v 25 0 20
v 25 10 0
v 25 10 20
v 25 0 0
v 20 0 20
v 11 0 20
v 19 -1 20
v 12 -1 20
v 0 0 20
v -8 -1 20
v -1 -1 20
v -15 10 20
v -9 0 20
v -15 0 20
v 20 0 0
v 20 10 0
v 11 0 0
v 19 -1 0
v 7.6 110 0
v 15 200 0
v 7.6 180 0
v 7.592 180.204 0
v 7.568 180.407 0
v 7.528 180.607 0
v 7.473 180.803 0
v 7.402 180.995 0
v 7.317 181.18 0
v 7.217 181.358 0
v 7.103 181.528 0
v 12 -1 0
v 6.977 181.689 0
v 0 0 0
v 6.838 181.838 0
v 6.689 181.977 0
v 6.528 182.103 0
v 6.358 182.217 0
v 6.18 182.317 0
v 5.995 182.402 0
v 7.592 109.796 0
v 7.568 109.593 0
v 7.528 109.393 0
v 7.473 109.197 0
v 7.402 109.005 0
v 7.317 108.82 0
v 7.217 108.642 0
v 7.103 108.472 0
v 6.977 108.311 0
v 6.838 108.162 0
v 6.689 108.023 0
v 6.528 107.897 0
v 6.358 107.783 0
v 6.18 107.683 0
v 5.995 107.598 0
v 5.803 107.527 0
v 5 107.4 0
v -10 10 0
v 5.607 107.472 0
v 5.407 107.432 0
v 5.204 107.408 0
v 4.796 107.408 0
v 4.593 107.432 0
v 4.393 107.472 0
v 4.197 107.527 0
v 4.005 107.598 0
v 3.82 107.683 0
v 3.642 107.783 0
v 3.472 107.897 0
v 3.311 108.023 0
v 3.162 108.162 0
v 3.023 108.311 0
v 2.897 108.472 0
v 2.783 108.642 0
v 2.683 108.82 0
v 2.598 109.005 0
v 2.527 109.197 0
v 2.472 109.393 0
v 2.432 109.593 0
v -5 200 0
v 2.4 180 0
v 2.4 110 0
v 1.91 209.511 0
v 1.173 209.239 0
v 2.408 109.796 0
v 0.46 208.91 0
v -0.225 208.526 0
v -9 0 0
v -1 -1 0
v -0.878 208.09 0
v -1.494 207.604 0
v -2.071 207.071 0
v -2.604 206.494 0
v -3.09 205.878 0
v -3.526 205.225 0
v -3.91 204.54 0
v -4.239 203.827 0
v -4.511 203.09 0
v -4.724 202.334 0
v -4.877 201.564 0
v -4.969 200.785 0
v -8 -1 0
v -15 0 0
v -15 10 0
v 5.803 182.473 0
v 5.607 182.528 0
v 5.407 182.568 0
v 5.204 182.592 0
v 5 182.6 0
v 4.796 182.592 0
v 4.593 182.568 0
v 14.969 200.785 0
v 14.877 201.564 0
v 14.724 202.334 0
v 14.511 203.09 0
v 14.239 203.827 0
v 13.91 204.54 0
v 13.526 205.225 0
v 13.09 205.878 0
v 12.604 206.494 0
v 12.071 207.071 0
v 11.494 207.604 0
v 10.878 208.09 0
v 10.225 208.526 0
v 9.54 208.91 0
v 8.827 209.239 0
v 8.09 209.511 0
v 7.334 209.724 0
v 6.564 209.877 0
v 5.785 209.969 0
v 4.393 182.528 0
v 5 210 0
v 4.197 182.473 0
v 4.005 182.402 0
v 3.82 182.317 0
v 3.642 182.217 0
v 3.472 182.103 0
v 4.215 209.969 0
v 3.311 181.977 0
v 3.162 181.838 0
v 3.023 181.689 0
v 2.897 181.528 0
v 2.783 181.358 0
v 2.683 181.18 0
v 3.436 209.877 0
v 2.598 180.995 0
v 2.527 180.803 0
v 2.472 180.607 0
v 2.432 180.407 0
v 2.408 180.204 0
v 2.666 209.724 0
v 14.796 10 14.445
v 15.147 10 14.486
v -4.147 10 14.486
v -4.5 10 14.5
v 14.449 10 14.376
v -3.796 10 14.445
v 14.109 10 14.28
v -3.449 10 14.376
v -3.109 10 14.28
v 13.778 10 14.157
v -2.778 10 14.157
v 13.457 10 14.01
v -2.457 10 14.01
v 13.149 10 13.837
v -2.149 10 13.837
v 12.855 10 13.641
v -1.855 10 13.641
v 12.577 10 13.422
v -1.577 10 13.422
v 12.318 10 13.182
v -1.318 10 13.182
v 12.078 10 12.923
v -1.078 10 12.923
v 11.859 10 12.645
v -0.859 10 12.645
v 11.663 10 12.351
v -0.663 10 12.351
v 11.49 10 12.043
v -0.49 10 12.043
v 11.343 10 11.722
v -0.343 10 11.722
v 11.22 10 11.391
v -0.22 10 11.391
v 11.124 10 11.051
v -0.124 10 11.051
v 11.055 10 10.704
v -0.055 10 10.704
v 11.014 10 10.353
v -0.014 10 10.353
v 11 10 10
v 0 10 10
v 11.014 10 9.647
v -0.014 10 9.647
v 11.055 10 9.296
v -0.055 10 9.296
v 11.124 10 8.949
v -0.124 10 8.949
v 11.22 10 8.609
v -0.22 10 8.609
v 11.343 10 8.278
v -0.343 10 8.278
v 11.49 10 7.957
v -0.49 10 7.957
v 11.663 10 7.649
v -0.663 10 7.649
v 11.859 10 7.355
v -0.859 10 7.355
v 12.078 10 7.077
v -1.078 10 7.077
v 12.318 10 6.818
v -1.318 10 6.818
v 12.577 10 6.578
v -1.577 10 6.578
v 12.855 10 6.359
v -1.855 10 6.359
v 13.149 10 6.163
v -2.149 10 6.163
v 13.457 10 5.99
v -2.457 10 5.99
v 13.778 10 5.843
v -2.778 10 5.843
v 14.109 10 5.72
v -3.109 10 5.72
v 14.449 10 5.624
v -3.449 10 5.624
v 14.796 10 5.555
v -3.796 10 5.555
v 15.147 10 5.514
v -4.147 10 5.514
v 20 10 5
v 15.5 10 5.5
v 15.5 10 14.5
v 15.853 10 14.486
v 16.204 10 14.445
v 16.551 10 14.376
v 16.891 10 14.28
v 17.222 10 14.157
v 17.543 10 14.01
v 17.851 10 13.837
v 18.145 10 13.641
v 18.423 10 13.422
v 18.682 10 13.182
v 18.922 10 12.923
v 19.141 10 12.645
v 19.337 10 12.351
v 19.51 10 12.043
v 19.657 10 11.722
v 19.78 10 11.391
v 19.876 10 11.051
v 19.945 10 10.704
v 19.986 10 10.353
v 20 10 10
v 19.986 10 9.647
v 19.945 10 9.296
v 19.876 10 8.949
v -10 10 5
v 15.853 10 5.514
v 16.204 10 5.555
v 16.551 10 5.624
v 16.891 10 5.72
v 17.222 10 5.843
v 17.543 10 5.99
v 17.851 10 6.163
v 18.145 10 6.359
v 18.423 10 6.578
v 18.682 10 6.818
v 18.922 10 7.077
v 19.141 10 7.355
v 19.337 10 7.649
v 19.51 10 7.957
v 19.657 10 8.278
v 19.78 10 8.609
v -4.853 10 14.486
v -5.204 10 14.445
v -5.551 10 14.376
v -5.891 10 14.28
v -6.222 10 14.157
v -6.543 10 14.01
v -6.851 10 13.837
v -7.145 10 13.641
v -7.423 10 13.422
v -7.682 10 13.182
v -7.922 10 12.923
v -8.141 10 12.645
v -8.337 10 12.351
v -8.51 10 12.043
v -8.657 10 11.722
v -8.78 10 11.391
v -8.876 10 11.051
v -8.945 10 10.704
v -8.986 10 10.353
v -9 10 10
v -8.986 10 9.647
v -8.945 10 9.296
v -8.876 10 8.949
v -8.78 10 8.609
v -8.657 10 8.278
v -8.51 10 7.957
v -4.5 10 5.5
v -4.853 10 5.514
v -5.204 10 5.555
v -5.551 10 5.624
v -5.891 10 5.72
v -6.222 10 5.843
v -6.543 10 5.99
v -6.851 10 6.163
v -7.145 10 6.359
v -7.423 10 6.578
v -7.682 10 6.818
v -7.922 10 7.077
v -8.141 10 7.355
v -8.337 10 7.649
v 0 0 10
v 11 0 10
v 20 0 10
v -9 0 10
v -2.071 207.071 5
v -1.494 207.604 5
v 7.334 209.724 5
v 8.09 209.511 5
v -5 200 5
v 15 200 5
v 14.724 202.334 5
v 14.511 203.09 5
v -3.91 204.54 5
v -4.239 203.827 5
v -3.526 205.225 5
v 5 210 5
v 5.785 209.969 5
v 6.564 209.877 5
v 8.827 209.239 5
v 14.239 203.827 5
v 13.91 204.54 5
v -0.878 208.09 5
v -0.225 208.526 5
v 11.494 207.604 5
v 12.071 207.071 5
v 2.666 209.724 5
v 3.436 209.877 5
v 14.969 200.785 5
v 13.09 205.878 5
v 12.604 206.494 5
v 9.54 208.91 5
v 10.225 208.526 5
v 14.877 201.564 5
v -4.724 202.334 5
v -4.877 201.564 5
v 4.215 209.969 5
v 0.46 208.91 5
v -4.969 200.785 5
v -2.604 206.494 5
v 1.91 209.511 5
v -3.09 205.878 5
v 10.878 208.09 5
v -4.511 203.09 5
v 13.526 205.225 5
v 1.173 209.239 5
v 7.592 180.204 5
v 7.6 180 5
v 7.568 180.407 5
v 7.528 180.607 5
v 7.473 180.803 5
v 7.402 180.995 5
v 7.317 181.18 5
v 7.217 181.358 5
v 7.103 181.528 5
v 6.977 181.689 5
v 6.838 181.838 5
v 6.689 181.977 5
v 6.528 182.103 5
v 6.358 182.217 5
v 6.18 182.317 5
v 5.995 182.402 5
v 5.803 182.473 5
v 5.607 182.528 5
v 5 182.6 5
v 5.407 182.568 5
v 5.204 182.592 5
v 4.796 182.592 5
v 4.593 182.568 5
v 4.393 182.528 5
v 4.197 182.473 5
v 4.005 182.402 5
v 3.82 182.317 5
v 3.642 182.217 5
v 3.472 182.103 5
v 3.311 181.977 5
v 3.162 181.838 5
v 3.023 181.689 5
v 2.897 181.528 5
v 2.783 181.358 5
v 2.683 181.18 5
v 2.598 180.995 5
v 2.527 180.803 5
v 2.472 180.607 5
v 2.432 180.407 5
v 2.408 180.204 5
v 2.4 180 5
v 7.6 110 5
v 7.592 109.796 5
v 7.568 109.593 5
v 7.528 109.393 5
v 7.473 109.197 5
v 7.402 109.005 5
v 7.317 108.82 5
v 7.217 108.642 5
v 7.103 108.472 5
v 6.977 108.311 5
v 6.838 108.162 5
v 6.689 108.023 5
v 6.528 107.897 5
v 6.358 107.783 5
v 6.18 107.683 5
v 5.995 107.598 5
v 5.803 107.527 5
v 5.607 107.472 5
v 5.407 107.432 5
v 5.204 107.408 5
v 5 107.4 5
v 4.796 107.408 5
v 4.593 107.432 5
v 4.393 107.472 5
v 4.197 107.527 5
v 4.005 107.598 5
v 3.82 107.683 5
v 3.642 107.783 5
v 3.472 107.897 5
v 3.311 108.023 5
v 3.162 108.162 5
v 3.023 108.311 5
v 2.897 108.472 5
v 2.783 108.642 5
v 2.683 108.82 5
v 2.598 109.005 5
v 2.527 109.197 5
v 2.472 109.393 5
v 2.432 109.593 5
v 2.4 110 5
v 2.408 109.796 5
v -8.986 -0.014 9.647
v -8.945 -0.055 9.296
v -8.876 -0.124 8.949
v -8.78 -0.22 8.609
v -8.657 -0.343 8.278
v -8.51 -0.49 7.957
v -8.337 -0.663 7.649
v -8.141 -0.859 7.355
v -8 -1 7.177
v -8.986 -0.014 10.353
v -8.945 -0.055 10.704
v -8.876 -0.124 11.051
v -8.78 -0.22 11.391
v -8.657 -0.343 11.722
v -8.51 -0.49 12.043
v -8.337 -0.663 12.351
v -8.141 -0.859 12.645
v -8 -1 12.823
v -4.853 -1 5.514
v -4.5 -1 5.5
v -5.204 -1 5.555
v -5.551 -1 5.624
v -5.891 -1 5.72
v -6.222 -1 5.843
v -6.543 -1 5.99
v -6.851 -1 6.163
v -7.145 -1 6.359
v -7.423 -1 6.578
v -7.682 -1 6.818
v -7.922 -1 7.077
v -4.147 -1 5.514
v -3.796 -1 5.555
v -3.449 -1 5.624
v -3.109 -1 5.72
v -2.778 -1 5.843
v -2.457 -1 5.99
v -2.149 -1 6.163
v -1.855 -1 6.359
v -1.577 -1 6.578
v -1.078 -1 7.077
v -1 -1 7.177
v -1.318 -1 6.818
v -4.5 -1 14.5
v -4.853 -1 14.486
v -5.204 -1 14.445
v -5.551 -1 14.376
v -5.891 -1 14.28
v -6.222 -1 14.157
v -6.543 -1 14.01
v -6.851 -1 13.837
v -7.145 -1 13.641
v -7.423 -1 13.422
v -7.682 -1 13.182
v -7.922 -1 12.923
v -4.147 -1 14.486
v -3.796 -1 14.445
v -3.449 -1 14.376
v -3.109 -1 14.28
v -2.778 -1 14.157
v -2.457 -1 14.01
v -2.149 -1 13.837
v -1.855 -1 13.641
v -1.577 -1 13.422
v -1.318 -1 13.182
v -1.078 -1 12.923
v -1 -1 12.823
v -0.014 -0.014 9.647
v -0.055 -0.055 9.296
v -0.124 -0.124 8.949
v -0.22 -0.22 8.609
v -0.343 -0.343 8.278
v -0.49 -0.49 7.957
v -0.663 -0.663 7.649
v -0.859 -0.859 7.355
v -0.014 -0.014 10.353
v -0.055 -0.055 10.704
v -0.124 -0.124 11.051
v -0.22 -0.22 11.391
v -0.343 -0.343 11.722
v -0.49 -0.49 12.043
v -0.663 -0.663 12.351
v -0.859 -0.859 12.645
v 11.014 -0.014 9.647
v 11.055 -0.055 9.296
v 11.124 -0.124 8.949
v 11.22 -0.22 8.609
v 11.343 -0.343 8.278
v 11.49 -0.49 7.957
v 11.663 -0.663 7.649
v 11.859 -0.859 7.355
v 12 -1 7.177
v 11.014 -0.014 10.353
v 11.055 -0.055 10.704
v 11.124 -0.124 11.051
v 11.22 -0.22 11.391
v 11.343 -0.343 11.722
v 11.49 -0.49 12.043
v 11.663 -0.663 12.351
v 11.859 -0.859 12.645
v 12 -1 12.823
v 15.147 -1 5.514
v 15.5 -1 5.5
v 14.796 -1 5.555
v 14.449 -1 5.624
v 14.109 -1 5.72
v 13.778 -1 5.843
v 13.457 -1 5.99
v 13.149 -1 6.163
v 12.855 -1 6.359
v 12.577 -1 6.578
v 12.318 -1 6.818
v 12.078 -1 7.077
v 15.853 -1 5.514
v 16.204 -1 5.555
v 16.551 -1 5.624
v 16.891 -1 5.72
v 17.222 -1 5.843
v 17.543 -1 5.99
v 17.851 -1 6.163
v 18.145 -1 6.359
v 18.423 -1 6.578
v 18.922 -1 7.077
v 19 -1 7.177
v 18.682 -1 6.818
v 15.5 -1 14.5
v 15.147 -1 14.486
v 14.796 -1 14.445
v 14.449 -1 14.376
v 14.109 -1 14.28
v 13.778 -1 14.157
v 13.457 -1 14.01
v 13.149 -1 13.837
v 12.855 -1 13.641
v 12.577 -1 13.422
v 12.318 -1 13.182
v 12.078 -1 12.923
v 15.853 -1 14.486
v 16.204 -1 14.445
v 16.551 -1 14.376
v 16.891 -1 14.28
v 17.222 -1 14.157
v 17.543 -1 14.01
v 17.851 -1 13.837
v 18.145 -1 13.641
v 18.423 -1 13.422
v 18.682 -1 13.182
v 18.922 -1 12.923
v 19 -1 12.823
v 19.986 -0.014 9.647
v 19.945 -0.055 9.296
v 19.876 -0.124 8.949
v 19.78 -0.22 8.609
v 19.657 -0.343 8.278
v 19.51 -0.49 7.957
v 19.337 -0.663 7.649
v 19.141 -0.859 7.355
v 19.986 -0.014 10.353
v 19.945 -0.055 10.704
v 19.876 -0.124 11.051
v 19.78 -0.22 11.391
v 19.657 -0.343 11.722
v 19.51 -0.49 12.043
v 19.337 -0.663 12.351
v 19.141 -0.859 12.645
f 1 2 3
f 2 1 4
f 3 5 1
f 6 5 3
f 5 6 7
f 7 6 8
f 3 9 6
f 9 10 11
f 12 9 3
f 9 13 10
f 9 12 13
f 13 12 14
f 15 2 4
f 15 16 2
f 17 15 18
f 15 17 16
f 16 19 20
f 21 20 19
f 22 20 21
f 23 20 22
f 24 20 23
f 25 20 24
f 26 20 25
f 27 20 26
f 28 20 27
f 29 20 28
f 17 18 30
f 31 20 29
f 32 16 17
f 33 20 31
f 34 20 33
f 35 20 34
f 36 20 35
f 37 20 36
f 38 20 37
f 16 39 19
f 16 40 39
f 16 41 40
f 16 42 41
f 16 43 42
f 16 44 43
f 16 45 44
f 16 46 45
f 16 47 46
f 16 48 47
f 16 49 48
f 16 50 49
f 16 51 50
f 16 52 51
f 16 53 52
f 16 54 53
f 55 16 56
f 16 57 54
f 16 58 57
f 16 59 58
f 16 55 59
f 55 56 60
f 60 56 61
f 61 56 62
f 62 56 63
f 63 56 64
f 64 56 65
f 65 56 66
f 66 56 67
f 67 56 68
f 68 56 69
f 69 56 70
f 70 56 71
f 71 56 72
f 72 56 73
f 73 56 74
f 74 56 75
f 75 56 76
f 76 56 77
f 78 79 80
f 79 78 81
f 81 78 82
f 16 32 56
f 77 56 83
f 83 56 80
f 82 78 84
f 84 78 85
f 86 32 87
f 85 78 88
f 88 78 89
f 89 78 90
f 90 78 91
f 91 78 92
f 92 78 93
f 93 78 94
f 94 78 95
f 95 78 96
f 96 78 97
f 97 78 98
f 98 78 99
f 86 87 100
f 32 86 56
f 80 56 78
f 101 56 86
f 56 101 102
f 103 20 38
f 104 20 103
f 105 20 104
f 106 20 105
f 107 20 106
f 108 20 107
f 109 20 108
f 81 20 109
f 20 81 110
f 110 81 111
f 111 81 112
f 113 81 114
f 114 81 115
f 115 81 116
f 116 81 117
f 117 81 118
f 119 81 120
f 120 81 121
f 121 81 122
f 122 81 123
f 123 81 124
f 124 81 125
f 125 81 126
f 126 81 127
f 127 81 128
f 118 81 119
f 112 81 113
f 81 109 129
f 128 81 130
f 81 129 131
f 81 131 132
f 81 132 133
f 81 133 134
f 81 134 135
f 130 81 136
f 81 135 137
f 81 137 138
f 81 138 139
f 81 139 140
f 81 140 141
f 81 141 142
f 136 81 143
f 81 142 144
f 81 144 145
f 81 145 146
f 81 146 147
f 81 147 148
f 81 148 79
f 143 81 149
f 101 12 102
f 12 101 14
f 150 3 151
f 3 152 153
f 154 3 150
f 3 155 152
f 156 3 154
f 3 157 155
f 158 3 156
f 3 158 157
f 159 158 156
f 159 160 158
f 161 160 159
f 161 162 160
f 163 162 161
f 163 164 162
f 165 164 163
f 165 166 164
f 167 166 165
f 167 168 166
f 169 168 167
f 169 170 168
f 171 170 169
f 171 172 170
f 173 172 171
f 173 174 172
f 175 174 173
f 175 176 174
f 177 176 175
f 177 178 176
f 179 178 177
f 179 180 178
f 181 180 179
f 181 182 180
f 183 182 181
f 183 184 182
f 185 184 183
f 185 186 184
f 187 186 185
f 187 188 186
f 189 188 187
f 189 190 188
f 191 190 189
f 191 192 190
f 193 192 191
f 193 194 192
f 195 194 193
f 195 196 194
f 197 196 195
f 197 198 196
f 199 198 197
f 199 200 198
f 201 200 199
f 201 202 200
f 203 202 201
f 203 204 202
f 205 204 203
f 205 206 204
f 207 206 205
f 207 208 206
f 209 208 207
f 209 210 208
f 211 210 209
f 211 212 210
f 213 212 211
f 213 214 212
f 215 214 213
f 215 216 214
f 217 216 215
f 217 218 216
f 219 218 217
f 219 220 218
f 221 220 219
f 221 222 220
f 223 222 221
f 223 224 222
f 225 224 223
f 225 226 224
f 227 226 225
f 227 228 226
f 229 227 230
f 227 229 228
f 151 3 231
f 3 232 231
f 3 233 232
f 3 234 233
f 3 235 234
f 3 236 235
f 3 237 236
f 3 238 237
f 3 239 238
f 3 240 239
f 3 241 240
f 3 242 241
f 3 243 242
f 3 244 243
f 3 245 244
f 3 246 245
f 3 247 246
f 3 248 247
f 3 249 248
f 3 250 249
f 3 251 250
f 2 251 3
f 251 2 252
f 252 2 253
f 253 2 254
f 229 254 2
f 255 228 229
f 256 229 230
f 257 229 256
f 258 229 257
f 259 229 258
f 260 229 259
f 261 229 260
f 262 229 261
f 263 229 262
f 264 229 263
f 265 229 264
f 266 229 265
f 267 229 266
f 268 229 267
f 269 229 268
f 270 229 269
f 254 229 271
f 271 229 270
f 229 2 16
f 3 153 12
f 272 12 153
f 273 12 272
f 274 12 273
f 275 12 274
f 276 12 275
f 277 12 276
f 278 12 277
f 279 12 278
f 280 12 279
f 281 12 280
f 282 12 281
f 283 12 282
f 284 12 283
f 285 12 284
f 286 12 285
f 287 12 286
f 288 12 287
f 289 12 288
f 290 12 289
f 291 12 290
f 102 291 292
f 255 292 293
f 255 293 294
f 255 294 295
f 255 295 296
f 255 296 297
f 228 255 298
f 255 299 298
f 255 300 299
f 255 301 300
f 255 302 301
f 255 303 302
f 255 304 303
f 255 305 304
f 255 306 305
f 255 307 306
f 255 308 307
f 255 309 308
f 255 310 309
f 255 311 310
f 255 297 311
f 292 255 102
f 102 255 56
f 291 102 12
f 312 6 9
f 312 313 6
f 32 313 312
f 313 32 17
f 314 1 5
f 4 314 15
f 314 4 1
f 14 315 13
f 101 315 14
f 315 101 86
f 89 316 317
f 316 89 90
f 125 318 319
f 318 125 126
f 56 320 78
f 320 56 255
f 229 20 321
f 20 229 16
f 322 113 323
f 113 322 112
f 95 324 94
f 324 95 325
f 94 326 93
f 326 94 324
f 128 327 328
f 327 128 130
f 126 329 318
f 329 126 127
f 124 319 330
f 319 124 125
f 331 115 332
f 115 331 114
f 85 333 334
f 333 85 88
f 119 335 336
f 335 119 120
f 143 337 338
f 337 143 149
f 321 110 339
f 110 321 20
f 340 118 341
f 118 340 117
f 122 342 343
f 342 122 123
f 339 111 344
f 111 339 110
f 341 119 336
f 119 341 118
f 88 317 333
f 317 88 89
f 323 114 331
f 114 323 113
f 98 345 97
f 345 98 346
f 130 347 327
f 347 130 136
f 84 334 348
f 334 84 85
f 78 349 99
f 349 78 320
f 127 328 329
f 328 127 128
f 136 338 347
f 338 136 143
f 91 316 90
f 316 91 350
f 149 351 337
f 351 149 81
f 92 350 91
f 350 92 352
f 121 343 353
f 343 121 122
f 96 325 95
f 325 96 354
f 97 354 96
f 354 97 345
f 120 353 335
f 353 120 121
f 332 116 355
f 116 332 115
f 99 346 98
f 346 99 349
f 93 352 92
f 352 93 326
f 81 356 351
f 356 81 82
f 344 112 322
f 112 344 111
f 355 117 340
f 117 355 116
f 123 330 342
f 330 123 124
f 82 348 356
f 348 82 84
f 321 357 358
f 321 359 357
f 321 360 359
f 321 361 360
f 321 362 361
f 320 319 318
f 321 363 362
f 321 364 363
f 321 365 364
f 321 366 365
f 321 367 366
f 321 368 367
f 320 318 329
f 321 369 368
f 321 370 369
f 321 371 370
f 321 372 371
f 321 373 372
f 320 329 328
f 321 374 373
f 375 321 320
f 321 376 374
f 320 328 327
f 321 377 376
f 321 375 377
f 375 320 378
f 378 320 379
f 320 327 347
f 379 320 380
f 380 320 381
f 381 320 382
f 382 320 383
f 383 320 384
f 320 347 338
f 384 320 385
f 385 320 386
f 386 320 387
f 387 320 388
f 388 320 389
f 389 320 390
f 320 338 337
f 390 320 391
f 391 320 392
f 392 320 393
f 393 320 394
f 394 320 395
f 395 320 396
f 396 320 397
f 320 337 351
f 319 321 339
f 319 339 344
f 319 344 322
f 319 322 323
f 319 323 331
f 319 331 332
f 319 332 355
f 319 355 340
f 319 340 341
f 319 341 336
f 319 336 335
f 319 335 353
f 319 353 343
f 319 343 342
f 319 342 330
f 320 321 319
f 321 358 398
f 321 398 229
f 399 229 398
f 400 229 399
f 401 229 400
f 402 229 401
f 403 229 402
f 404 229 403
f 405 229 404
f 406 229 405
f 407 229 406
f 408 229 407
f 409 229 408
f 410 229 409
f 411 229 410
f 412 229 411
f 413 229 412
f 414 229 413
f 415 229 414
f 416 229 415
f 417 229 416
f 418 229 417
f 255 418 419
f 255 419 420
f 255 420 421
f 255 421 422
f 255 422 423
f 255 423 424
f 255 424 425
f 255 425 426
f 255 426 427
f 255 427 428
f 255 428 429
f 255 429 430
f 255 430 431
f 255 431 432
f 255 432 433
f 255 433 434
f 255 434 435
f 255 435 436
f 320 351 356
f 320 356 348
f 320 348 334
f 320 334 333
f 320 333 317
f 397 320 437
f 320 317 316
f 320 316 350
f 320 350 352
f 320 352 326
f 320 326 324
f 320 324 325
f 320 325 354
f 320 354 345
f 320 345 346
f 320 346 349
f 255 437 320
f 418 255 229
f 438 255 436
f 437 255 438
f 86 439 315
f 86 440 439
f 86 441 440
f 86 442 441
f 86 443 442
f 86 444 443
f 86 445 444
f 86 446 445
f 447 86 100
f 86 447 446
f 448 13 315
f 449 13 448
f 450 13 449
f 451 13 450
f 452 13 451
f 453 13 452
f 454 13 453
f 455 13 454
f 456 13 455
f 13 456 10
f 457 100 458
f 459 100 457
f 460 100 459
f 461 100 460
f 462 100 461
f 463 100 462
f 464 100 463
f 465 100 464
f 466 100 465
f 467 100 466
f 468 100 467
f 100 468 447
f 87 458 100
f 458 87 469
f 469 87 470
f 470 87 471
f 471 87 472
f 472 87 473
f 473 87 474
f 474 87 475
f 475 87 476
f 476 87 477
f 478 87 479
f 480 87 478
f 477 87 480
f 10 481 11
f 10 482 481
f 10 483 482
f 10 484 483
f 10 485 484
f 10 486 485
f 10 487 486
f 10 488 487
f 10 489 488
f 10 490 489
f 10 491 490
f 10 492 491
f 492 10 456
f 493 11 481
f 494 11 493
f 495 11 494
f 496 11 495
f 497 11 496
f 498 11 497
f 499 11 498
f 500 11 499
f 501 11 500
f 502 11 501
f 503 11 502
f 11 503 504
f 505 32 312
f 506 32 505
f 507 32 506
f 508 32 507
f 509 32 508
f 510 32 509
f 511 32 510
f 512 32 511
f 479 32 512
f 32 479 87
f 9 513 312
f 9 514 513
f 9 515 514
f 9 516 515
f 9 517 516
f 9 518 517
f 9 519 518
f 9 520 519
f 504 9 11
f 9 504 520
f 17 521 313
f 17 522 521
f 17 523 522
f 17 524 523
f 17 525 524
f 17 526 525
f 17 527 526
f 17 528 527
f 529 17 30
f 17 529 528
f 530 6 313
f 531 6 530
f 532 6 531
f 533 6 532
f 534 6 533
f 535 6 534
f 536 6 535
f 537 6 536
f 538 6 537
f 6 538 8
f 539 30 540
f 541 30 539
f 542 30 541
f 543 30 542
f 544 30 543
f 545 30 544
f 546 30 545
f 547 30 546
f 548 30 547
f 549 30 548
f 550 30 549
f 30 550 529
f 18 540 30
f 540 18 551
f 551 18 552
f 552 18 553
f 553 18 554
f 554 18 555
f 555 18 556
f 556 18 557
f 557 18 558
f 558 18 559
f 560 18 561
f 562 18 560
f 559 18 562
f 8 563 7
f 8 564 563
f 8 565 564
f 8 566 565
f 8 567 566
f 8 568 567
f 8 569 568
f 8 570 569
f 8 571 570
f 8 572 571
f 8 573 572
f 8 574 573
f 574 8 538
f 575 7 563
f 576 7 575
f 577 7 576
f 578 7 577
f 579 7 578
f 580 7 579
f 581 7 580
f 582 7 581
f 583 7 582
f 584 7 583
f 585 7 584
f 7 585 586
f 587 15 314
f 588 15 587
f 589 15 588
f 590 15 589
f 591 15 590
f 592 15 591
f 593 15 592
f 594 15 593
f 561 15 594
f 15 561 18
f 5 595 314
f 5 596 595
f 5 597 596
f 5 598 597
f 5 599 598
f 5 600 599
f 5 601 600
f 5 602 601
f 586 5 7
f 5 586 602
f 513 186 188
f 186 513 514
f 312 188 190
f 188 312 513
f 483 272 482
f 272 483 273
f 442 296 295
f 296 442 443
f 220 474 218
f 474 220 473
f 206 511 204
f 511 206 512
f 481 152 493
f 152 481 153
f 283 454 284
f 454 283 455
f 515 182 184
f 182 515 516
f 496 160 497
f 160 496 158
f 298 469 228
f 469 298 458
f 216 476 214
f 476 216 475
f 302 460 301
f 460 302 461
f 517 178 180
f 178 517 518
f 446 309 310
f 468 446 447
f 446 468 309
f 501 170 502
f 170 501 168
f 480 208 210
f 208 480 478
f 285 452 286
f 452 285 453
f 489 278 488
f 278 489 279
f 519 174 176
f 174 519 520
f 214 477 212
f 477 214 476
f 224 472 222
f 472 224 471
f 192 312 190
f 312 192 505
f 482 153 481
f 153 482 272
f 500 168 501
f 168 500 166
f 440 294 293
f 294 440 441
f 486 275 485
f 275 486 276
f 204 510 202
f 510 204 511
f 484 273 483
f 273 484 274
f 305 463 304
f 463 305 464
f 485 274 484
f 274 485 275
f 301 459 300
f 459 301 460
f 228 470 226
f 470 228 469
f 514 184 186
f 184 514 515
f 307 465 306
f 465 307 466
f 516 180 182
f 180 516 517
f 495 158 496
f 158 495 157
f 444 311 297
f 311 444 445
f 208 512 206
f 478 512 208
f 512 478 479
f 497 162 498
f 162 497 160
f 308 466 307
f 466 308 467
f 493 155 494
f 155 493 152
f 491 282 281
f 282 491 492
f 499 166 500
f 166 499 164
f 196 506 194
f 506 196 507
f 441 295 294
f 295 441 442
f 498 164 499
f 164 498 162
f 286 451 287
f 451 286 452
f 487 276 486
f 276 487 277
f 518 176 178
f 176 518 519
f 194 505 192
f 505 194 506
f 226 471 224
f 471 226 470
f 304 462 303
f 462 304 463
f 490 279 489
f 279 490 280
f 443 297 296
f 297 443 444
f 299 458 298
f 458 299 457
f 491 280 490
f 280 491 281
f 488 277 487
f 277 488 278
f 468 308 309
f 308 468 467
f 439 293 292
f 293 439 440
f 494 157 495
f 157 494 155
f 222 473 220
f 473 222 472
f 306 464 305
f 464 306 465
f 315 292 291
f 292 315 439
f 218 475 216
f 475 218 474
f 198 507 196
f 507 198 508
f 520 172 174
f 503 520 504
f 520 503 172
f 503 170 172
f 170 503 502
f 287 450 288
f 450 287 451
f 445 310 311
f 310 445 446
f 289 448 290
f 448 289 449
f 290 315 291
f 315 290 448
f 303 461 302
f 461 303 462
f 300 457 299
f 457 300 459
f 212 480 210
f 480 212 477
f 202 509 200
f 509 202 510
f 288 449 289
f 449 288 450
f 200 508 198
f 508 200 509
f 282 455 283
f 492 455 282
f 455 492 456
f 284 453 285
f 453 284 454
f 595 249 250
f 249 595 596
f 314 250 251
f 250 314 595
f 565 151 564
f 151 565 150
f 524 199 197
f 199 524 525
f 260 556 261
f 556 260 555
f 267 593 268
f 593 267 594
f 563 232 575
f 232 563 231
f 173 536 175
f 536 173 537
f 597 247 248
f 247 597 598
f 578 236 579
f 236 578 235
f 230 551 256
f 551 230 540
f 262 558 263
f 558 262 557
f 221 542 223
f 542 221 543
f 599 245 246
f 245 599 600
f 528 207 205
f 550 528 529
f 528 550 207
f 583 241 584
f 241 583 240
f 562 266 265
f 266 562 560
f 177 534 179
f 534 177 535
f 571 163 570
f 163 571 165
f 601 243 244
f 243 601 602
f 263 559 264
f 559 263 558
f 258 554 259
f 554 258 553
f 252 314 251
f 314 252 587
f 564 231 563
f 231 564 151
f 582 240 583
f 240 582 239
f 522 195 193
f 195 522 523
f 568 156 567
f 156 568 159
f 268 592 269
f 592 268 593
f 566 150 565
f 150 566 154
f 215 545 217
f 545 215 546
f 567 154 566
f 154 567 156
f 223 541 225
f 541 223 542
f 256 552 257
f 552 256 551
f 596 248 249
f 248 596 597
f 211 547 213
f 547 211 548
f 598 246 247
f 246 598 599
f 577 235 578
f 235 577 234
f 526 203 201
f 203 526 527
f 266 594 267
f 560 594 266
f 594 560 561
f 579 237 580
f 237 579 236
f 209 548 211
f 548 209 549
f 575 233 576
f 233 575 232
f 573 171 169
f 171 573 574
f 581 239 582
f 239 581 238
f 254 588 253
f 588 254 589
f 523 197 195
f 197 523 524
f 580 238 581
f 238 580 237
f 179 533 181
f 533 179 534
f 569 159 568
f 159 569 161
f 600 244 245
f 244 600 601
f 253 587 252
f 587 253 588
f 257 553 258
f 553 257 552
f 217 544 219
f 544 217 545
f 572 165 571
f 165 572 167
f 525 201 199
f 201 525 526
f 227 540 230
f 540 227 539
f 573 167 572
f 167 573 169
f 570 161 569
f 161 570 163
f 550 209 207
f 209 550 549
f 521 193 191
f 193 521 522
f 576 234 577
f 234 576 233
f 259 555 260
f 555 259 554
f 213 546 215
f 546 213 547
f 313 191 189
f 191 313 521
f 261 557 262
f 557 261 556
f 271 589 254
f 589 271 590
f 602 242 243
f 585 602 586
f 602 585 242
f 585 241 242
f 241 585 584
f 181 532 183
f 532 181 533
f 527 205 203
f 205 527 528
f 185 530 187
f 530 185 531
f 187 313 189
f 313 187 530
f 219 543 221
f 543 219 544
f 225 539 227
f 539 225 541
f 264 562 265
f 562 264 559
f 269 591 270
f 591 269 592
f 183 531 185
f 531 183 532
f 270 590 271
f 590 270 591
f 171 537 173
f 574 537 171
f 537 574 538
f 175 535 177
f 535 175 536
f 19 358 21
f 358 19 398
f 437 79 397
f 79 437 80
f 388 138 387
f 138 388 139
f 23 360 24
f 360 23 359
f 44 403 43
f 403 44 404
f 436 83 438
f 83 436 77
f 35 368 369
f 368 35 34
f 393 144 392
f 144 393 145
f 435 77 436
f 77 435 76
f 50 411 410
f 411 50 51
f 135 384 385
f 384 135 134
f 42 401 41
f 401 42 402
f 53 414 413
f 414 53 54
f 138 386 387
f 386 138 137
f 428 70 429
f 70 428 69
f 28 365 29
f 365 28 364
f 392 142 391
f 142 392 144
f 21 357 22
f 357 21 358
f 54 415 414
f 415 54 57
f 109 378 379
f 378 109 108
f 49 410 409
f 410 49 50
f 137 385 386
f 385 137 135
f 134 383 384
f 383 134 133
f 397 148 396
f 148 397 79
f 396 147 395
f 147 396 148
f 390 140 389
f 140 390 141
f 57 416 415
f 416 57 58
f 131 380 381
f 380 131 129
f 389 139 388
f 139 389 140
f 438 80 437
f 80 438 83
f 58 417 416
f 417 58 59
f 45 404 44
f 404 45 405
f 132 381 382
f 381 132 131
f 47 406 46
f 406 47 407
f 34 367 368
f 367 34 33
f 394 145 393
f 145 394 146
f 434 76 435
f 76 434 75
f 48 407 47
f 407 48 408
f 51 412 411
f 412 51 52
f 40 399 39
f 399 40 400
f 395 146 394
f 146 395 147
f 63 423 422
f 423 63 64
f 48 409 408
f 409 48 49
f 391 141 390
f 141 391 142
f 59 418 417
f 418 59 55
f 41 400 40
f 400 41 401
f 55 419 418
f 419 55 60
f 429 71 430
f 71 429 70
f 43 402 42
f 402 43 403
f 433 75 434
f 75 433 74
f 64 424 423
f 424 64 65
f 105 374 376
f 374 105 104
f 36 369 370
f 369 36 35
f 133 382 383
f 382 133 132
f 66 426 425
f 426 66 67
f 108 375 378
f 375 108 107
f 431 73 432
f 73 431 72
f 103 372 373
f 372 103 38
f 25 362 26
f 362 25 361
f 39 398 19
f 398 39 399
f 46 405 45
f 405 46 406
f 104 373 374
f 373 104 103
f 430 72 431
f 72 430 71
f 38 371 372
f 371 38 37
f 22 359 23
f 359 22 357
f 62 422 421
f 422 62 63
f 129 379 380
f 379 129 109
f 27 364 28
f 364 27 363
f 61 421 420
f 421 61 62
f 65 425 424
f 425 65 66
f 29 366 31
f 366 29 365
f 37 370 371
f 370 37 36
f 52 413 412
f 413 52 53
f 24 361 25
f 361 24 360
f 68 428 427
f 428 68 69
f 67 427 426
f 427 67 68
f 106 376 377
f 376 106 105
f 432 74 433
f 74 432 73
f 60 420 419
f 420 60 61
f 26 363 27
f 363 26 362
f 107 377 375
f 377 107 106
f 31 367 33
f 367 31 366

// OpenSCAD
$fn=80;

// 4.8 mm deep hole for using an 8mm bolt

difference() {
// union() {
   union() {
      translate([-15,0,0]) cube([40,10,20]);
      hull() {
         translate([-10,0,0]) cube([30,10,5]);
         translate([5,200,0]) cylinder(d=20,h=5);
      }
      translate([0,0,0]) rotate([0,0,180])
         linear_extrude(height=20)
         polygon(points=[[-0.1,0],[0,0],[1,1],[8,1],[9,0],[9,-0.1]]);
      translate([20,0,0]) rotate([0,0,180])
         linear_extrude(height=20)
         polygon(points=[[-0.1,0],[0,0],[1,1],[8,1],[9,0],[9,-0.1]]);
   }

   union() {
      translate([5,110,-0.5]) hull() {
         cylinder(d=5.2,h=6);
         translate([0,70,0]) cylinder(d=5.2,h=6);
      }
      translate([-9/2,-2.2,10]) rotate([90,0,0]) {
         /* bolt holes */
         translate([0,0,14-4.8]) cylinder(h=15,d=5.2);
   
         /* cap holes (with a little gap to allow bridging */
         translate([0,0,-20]) cylinder(h=30,d=9);
      }
      translate([20-9/2,-2.2,10]) rotate([90,0,0]) {
         /* bolt holes */
         translate([0,0,14-4.8]) cylinder(h=15,d=5.2);
   
         /* cap holes (with a little gap to allow bridging */
         translate([0,0,-20]) cylinder(h=30,d=9);
      }
   }
}

if (0) difference() {
   union() {
      translate([-15,-16,0]) {
         hull() {
            translate([5,0,0]) cube([25,10,20]);
            translate([33,0,10.5]) rotate([-90,0,0]) cylinder(d=21,h=20);

            translate([27,0,0]) cube([12,20,15]);

         }

         /* angled bit to fit in v-slot */
         translate([19.5,0,0]) rotate([0,0,180])
            linear_extrude(height=20)
            polygon(points=[[-0.1,0],[0,0],[1,1],[8,1],[9,0],[9,-0.1]]);
      }
   }

   /* conduit hole */
   translate([18,-17,10.5]) rotate([-90,0,0]) cylinder(d=16,h=25);
   translate([0,-2.2,10]) rotate([90,0,0]) {
      /* bolt holes */
      translate([0,0,14-4.8]) cylinder(h=15,d=5.2);

      /* cap holes (with a little gap to allow bridging */
      translate([0,0,-20]) cylinder(h=30,d=9);
   }
   translate([15,-20,12]) cube([7,30,10]);
   translate([8,-4,-1]) cylinder(d=3,h=30);
}
